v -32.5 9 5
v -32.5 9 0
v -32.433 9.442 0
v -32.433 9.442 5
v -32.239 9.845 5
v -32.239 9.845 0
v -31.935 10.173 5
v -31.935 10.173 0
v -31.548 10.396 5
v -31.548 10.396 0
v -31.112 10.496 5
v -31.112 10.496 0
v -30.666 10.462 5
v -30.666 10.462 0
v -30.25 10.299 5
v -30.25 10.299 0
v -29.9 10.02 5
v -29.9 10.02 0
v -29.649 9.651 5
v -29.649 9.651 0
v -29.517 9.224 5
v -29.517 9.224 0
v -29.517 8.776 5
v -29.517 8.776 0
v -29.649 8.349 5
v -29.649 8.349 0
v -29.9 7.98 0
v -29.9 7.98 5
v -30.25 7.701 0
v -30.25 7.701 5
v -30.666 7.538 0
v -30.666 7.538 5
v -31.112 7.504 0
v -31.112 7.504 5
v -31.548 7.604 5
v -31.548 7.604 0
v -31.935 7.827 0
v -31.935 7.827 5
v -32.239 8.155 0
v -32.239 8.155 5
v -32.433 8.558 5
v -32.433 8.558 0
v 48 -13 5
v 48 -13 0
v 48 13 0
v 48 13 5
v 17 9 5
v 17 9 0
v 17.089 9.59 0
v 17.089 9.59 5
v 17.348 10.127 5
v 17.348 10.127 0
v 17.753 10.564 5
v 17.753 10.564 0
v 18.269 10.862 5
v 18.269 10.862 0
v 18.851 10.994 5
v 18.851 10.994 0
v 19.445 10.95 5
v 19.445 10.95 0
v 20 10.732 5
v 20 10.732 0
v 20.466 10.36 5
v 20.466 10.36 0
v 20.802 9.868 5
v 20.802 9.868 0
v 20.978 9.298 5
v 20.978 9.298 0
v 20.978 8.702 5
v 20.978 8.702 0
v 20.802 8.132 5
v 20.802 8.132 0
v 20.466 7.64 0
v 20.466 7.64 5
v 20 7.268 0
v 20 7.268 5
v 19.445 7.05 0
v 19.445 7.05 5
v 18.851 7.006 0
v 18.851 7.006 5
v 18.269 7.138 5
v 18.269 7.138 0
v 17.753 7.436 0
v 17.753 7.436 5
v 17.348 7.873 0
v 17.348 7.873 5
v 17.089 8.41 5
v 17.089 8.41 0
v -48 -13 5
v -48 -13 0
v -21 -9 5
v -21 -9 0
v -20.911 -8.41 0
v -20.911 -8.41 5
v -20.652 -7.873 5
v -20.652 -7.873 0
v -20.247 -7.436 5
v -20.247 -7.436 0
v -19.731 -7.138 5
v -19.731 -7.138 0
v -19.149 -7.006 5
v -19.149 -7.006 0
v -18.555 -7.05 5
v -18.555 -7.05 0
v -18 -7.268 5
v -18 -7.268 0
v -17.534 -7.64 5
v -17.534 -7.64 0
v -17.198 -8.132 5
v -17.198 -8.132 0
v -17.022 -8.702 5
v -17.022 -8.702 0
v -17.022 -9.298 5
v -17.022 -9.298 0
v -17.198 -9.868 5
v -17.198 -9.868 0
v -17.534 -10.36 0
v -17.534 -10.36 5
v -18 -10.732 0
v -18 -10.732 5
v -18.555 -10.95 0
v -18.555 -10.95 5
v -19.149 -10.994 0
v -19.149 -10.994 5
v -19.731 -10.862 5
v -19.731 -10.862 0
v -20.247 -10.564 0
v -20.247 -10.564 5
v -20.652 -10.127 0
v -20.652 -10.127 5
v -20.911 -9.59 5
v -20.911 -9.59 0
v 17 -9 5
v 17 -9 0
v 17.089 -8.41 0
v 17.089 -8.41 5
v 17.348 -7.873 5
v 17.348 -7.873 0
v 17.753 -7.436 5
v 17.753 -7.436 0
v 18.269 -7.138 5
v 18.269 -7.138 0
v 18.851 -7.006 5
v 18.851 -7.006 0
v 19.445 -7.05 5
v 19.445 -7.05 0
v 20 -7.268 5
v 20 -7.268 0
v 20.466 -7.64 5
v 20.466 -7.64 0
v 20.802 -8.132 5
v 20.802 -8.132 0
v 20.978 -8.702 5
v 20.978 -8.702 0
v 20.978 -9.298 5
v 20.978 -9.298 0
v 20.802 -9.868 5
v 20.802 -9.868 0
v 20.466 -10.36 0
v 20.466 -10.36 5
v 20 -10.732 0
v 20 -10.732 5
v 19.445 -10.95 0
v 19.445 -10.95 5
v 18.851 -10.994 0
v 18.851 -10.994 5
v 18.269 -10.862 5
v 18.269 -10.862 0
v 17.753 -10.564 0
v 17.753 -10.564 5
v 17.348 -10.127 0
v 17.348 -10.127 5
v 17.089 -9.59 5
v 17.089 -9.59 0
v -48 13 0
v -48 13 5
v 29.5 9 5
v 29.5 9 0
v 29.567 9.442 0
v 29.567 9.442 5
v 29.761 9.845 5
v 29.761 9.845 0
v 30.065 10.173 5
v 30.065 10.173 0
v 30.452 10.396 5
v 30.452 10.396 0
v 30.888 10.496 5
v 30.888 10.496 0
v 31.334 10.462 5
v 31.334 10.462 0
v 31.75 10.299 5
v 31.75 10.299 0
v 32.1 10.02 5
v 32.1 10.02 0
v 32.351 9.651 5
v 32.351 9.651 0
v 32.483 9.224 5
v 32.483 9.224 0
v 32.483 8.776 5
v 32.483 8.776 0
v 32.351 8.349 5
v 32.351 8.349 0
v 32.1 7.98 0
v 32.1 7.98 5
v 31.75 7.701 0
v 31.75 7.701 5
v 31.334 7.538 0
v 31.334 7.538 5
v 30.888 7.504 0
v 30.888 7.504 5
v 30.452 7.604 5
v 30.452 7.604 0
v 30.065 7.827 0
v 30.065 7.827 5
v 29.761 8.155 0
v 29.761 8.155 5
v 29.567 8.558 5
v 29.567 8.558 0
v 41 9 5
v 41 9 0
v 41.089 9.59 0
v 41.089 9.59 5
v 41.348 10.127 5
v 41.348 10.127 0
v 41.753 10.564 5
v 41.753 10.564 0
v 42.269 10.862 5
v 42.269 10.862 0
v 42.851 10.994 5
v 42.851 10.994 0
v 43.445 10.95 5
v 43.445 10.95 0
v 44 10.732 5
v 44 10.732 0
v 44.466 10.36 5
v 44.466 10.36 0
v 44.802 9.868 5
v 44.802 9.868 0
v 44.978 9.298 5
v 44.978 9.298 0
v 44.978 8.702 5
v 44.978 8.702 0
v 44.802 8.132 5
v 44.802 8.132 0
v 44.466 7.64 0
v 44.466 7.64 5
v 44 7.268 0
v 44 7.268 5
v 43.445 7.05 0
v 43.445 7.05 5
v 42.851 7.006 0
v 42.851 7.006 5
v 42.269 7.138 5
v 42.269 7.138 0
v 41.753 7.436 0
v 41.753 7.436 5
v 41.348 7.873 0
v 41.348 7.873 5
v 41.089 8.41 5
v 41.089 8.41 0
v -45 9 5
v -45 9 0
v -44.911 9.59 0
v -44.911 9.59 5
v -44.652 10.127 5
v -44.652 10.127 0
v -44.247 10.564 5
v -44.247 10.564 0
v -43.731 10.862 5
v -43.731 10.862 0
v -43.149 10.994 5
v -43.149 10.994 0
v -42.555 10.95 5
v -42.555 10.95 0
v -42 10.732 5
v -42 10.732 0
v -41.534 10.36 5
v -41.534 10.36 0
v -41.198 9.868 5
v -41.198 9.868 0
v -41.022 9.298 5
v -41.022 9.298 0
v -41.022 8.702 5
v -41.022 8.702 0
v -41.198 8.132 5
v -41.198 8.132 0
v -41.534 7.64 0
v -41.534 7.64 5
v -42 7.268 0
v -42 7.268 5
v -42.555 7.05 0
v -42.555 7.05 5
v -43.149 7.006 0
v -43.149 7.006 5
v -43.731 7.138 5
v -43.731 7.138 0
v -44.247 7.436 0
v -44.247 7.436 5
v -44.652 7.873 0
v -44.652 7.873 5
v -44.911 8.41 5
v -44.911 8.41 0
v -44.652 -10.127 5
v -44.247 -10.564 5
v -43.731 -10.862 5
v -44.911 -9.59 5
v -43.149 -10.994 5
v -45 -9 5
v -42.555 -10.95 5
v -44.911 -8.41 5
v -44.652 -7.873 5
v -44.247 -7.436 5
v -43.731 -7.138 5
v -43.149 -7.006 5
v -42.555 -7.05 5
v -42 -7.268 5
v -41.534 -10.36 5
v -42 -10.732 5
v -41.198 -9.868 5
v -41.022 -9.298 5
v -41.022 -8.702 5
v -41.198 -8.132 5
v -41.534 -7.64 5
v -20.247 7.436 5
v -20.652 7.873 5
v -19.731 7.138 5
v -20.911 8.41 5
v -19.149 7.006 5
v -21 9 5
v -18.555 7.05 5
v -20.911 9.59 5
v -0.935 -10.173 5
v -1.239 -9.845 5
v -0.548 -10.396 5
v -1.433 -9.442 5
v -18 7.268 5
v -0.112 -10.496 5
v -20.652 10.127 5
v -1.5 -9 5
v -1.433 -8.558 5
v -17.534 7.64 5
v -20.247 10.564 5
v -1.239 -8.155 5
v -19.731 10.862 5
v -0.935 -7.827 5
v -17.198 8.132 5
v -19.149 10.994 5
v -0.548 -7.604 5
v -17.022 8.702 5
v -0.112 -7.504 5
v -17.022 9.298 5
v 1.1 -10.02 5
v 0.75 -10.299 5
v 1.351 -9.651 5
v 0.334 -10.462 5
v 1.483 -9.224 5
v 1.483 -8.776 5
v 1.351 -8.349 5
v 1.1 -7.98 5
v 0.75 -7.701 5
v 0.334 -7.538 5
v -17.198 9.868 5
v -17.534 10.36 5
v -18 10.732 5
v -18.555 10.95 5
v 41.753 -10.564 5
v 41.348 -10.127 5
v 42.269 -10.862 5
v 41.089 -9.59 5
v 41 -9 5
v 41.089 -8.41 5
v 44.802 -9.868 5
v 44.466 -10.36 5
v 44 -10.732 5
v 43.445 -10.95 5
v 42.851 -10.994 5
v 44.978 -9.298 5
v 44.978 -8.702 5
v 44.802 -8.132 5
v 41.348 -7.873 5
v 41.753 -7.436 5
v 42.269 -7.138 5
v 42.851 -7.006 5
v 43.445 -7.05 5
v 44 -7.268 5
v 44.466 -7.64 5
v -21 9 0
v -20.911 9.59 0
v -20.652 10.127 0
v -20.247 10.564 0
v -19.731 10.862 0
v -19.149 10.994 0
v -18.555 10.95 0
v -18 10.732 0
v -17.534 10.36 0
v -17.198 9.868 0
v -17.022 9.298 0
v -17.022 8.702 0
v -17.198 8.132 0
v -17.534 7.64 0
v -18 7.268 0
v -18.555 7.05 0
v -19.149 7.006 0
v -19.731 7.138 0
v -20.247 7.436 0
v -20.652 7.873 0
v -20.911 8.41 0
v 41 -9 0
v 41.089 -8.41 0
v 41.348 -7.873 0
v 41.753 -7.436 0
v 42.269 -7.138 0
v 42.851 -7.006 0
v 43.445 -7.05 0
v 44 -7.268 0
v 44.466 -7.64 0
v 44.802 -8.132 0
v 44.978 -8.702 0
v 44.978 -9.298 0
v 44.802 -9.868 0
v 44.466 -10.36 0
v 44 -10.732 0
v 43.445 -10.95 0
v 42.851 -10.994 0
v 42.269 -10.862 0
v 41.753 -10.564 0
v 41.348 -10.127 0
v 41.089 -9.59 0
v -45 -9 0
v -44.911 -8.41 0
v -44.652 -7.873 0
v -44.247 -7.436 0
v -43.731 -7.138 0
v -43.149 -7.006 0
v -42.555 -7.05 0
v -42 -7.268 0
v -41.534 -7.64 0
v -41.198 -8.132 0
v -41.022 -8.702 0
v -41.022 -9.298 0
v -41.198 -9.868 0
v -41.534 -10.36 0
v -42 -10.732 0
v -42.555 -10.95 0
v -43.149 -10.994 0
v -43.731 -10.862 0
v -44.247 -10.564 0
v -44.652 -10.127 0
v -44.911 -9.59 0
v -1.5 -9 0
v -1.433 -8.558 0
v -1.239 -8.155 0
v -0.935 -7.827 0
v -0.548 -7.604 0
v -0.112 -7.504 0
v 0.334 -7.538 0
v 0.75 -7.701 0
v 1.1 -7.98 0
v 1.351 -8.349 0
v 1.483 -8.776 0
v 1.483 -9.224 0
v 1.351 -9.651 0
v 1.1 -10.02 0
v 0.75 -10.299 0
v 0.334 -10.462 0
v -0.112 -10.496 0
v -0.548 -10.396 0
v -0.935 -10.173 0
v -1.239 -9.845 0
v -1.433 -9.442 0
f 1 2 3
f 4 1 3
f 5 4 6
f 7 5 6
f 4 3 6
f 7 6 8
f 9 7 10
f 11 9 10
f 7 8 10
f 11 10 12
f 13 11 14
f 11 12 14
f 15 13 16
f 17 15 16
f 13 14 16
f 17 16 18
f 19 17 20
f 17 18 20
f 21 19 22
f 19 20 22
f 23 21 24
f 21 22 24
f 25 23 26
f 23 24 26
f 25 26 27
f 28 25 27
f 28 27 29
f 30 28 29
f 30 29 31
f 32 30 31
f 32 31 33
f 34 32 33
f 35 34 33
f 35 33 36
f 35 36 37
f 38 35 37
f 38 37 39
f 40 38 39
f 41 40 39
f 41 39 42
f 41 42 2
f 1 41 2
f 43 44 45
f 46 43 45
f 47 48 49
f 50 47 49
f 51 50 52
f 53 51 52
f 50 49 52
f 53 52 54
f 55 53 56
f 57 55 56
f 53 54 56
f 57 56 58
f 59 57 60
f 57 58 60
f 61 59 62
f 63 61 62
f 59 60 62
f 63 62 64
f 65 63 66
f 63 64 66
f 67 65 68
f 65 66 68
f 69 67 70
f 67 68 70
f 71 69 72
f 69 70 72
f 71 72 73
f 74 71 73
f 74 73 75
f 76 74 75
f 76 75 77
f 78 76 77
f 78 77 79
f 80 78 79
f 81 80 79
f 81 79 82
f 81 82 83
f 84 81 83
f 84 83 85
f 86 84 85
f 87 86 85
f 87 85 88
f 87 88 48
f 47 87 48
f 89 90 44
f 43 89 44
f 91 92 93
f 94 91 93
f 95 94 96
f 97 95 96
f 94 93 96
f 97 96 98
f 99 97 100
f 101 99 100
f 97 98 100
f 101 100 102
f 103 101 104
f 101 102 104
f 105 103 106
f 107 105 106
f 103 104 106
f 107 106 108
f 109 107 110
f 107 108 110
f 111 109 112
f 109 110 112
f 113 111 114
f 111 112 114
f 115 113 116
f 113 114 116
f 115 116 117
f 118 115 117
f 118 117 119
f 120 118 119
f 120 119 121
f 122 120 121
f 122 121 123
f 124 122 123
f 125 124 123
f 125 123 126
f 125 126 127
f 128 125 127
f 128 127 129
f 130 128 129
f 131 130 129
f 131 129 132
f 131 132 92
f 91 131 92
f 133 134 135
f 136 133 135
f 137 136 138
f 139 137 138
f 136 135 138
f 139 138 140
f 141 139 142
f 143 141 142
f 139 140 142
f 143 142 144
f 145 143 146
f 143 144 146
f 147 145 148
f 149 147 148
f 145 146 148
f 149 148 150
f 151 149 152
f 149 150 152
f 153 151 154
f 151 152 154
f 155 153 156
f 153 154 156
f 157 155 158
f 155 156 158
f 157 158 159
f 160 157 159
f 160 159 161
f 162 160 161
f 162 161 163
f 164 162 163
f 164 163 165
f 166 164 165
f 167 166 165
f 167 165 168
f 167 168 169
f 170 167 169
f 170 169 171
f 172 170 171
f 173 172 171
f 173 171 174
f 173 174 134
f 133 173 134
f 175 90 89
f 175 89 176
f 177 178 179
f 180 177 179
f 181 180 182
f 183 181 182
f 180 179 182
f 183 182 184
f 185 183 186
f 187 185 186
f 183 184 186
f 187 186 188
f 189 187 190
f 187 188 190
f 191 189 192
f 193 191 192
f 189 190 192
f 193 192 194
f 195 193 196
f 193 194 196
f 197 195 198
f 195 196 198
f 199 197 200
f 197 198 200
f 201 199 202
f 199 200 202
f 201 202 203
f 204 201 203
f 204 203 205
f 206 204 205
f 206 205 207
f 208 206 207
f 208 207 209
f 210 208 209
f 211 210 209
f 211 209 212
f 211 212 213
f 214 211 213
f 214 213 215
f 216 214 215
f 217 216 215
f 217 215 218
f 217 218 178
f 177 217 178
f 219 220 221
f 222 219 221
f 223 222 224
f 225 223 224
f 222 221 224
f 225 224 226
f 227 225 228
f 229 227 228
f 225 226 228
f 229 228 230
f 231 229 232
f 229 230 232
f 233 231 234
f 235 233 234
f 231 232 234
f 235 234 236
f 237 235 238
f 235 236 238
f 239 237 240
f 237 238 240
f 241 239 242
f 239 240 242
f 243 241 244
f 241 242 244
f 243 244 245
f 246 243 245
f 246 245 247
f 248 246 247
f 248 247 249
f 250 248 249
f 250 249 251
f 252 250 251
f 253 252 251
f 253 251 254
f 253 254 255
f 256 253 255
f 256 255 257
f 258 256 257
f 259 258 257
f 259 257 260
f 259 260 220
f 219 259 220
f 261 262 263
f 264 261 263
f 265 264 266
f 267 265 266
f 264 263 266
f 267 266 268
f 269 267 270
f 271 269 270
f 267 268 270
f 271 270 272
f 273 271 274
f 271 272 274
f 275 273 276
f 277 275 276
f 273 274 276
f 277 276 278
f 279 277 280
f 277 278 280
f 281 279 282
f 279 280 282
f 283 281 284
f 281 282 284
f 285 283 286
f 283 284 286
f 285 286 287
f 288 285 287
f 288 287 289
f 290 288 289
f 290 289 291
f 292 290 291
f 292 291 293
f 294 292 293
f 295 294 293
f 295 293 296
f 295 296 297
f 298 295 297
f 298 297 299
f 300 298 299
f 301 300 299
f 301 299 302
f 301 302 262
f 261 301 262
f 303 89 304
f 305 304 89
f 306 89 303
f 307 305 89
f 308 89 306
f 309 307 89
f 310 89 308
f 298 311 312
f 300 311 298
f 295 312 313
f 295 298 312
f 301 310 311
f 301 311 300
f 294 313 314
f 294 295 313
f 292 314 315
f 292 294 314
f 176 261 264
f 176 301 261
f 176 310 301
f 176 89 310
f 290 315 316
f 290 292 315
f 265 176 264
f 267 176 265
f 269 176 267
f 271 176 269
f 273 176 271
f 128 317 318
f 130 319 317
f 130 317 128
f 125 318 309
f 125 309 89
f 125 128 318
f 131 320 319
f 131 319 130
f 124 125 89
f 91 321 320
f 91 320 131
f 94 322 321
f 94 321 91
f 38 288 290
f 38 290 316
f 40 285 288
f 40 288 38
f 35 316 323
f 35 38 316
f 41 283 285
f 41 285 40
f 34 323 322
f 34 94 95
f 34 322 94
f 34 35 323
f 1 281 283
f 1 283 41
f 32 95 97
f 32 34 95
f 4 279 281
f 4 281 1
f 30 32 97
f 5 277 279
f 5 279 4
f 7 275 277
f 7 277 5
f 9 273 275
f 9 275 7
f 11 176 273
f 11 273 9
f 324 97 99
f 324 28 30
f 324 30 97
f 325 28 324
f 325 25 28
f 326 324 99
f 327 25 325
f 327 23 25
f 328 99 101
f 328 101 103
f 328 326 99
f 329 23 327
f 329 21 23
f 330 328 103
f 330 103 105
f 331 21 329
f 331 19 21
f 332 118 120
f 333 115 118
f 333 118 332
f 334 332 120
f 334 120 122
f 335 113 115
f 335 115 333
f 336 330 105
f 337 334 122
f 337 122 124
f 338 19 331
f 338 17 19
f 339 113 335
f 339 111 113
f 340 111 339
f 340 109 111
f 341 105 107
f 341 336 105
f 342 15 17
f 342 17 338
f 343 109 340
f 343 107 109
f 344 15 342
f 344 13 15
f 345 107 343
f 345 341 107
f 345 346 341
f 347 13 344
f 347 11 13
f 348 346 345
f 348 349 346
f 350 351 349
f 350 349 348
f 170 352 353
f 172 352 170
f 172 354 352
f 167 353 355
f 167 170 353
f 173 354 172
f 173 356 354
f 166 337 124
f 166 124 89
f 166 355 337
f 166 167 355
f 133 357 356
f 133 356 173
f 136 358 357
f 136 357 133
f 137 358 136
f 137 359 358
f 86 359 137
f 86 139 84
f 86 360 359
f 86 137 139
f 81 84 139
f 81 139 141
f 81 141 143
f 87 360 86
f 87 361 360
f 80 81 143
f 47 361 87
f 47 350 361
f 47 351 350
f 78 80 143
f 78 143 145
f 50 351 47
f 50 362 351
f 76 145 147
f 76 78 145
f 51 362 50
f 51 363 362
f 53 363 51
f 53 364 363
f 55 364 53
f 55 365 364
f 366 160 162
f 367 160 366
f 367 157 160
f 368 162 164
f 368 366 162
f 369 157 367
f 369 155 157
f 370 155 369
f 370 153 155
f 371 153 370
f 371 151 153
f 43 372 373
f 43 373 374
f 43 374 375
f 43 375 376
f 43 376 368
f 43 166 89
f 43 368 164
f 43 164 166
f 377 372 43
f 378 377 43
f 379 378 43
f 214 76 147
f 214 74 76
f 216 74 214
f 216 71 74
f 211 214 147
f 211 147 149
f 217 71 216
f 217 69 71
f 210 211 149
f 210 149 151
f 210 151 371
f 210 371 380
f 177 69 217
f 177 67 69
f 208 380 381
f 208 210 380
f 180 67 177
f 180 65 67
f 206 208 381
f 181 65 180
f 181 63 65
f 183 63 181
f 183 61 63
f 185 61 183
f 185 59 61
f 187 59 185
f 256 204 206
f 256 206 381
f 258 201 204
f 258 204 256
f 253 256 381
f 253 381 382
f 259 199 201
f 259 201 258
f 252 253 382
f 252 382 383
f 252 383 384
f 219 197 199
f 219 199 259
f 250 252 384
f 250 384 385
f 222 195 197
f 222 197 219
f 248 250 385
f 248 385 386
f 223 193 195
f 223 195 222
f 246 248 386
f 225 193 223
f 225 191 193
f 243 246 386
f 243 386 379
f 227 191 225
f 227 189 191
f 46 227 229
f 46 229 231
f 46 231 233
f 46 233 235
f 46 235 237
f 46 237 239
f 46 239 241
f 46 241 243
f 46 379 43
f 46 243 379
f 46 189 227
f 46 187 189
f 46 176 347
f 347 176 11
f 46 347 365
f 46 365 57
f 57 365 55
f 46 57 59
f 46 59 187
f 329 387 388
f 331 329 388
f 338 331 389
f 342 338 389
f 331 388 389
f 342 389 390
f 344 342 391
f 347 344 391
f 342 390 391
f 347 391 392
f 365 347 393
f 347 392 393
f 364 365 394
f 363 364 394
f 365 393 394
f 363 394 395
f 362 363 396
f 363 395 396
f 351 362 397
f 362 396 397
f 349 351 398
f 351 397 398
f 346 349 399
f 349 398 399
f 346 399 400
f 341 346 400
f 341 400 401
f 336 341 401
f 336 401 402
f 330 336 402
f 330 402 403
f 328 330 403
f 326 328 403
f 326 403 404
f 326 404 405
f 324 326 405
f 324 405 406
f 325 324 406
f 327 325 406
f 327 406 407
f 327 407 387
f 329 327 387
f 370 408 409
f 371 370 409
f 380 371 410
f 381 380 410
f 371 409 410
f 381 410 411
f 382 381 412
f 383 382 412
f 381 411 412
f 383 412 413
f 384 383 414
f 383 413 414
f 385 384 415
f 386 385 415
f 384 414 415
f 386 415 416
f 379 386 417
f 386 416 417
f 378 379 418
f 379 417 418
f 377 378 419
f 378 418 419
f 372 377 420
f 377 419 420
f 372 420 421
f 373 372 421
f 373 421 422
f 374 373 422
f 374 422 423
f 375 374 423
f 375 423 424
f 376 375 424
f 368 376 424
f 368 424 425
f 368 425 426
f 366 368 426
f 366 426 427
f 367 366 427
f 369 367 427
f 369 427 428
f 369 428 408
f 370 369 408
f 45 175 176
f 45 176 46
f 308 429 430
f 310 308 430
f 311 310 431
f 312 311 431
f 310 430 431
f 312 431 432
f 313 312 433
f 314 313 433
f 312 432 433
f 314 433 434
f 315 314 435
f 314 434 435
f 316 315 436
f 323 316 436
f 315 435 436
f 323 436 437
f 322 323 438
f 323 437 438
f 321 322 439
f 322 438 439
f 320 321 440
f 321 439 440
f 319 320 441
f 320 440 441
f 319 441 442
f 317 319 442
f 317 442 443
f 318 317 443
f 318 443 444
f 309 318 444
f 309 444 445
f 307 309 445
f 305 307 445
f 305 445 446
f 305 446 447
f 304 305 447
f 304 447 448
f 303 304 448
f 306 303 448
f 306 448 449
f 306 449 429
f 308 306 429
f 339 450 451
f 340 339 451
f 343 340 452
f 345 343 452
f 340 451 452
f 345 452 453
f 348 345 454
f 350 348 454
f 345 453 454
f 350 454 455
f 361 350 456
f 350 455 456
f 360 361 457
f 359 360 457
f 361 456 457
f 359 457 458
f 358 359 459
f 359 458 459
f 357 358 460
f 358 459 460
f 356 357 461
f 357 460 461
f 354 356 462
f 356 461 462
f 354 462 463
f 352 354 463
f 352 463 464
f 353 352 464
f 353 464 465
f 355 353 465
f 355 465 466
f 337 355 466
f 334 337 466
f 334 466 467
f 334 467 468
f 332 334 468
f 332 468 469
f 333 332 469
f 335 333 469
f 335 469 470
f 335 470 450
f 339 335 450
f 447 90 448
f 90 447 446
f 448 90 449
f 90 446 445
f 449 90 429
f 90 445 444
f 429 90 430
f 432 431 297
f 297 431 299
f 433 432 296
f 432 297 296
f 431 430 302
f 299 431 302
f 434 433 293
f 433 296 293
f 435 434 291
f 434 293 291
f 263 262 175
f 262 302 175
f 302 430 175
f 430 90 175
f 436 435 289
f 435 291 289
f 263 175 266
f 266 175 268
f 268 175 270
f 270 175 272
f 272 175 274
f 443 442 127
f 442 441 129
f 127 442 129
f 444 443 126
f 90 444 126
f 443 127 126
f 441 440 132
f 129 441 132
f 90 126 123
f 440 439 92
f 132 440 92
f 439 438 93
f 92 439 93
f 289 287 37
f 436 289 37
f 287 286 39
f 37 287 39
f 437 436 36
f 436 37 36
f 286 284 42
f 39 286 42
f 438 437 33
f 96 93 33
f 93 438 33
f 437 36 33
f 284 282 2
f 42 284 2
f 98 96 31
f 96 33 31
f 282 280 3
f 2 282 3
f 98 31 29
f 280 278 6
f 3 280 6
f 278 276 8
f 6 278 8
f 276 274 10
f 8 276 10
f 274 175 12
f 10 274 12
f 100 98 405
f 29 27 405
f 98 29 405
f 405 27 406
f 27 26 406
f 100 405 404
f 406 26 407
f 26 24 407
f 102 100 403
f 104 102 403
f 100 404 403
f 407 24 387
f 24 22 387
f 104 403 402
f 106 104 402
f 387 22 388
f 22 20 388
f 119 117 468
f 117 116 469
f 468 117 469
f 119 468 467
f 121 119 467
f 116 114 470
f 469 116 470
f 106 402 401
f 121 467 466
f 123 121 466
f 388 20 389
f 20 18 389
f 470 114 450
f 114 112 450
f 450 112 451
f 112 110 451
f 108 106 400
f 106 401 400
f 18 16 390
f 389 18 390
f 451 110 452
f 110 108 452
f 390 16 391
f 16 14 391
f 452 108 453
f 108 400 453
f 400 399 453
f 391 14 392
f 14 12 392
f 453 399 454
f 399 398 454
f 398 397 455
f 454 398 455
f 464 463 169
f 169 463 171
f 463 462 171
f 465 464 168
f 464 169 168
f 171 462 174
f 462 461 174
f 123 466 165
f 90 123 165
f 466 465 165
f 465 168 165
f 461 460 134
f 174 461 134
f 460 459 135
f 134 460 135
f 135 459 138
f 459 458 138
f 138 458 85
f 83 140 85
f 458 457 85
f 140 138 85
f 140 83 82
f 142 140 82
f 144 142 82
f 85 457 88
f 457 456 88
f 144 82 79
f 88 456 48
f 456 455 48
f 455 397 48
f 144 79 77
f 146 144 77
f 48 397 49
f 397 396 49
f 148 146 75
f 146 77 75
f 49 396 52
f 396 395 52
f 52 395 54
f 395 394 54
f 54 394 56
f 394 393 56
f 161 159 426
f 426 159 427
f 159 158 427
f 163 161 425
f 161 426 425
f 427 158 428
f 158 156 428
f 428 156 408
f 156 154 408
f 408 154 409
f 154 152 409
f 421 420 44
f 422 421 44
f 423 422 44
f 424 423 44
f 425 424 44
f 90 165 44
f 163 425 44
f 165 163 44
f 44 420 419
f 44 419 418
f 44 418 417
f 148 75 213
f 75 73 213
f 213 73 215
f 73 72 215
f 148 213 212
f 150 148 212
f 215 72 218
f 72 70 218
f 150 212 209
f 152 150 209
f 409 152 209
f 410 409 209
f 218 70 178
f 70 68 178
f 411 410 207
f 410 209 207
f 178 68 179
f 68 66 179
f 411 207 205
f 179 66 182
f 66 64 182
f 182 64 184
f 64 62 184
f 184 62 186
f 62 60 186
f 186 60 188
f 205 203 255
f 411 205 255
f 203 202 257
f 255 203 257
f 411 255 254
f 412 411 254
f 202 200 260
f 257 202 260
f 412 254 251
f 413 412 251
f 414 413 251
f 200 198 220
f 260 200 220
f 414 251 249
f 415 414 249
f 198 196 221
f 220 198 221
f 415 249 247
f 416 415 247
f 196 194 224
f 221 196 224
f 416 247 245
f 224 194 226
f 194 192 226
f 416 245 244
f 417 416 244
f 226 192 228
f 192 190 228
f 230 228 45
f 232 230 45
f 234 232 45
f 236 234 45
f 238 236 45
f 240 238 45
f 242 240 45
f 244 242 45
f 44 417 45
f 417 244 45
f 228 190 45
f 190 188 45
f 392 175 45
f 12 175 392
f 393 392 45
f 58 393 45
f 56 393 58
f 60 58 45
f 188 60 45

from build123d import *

# Parameters (mm, degrees)
F0_W     = 96
F0_H     = 26
F1_DEPTH = 5
F3_D     = 4
F5_D     = 3


with BuildPart() as f1:
    # F0 (on Top) → F1 (new body)
    with BuildSketch(Plane.XY):
        Rectangle(F0_W, F0_H)
    extrude(amount=F1_DEPTH)

    # F3 (through all)
    with Locations(Plane.XY.offset(5)):
        with Locations((-43, 9), (-19, 9), (19, 9), (43, 9), (43, -9), (19, -9), (-19, -9), (-43, -9)):
            Hole(F3_D / 2)

    # F5 (through all)
    with Locations(Plane.XY.offset(5)):
        with Locations((-31, 9), (0, -9), (31, 9)):
            Hole(F5_D / 2)


solid = f1.part
